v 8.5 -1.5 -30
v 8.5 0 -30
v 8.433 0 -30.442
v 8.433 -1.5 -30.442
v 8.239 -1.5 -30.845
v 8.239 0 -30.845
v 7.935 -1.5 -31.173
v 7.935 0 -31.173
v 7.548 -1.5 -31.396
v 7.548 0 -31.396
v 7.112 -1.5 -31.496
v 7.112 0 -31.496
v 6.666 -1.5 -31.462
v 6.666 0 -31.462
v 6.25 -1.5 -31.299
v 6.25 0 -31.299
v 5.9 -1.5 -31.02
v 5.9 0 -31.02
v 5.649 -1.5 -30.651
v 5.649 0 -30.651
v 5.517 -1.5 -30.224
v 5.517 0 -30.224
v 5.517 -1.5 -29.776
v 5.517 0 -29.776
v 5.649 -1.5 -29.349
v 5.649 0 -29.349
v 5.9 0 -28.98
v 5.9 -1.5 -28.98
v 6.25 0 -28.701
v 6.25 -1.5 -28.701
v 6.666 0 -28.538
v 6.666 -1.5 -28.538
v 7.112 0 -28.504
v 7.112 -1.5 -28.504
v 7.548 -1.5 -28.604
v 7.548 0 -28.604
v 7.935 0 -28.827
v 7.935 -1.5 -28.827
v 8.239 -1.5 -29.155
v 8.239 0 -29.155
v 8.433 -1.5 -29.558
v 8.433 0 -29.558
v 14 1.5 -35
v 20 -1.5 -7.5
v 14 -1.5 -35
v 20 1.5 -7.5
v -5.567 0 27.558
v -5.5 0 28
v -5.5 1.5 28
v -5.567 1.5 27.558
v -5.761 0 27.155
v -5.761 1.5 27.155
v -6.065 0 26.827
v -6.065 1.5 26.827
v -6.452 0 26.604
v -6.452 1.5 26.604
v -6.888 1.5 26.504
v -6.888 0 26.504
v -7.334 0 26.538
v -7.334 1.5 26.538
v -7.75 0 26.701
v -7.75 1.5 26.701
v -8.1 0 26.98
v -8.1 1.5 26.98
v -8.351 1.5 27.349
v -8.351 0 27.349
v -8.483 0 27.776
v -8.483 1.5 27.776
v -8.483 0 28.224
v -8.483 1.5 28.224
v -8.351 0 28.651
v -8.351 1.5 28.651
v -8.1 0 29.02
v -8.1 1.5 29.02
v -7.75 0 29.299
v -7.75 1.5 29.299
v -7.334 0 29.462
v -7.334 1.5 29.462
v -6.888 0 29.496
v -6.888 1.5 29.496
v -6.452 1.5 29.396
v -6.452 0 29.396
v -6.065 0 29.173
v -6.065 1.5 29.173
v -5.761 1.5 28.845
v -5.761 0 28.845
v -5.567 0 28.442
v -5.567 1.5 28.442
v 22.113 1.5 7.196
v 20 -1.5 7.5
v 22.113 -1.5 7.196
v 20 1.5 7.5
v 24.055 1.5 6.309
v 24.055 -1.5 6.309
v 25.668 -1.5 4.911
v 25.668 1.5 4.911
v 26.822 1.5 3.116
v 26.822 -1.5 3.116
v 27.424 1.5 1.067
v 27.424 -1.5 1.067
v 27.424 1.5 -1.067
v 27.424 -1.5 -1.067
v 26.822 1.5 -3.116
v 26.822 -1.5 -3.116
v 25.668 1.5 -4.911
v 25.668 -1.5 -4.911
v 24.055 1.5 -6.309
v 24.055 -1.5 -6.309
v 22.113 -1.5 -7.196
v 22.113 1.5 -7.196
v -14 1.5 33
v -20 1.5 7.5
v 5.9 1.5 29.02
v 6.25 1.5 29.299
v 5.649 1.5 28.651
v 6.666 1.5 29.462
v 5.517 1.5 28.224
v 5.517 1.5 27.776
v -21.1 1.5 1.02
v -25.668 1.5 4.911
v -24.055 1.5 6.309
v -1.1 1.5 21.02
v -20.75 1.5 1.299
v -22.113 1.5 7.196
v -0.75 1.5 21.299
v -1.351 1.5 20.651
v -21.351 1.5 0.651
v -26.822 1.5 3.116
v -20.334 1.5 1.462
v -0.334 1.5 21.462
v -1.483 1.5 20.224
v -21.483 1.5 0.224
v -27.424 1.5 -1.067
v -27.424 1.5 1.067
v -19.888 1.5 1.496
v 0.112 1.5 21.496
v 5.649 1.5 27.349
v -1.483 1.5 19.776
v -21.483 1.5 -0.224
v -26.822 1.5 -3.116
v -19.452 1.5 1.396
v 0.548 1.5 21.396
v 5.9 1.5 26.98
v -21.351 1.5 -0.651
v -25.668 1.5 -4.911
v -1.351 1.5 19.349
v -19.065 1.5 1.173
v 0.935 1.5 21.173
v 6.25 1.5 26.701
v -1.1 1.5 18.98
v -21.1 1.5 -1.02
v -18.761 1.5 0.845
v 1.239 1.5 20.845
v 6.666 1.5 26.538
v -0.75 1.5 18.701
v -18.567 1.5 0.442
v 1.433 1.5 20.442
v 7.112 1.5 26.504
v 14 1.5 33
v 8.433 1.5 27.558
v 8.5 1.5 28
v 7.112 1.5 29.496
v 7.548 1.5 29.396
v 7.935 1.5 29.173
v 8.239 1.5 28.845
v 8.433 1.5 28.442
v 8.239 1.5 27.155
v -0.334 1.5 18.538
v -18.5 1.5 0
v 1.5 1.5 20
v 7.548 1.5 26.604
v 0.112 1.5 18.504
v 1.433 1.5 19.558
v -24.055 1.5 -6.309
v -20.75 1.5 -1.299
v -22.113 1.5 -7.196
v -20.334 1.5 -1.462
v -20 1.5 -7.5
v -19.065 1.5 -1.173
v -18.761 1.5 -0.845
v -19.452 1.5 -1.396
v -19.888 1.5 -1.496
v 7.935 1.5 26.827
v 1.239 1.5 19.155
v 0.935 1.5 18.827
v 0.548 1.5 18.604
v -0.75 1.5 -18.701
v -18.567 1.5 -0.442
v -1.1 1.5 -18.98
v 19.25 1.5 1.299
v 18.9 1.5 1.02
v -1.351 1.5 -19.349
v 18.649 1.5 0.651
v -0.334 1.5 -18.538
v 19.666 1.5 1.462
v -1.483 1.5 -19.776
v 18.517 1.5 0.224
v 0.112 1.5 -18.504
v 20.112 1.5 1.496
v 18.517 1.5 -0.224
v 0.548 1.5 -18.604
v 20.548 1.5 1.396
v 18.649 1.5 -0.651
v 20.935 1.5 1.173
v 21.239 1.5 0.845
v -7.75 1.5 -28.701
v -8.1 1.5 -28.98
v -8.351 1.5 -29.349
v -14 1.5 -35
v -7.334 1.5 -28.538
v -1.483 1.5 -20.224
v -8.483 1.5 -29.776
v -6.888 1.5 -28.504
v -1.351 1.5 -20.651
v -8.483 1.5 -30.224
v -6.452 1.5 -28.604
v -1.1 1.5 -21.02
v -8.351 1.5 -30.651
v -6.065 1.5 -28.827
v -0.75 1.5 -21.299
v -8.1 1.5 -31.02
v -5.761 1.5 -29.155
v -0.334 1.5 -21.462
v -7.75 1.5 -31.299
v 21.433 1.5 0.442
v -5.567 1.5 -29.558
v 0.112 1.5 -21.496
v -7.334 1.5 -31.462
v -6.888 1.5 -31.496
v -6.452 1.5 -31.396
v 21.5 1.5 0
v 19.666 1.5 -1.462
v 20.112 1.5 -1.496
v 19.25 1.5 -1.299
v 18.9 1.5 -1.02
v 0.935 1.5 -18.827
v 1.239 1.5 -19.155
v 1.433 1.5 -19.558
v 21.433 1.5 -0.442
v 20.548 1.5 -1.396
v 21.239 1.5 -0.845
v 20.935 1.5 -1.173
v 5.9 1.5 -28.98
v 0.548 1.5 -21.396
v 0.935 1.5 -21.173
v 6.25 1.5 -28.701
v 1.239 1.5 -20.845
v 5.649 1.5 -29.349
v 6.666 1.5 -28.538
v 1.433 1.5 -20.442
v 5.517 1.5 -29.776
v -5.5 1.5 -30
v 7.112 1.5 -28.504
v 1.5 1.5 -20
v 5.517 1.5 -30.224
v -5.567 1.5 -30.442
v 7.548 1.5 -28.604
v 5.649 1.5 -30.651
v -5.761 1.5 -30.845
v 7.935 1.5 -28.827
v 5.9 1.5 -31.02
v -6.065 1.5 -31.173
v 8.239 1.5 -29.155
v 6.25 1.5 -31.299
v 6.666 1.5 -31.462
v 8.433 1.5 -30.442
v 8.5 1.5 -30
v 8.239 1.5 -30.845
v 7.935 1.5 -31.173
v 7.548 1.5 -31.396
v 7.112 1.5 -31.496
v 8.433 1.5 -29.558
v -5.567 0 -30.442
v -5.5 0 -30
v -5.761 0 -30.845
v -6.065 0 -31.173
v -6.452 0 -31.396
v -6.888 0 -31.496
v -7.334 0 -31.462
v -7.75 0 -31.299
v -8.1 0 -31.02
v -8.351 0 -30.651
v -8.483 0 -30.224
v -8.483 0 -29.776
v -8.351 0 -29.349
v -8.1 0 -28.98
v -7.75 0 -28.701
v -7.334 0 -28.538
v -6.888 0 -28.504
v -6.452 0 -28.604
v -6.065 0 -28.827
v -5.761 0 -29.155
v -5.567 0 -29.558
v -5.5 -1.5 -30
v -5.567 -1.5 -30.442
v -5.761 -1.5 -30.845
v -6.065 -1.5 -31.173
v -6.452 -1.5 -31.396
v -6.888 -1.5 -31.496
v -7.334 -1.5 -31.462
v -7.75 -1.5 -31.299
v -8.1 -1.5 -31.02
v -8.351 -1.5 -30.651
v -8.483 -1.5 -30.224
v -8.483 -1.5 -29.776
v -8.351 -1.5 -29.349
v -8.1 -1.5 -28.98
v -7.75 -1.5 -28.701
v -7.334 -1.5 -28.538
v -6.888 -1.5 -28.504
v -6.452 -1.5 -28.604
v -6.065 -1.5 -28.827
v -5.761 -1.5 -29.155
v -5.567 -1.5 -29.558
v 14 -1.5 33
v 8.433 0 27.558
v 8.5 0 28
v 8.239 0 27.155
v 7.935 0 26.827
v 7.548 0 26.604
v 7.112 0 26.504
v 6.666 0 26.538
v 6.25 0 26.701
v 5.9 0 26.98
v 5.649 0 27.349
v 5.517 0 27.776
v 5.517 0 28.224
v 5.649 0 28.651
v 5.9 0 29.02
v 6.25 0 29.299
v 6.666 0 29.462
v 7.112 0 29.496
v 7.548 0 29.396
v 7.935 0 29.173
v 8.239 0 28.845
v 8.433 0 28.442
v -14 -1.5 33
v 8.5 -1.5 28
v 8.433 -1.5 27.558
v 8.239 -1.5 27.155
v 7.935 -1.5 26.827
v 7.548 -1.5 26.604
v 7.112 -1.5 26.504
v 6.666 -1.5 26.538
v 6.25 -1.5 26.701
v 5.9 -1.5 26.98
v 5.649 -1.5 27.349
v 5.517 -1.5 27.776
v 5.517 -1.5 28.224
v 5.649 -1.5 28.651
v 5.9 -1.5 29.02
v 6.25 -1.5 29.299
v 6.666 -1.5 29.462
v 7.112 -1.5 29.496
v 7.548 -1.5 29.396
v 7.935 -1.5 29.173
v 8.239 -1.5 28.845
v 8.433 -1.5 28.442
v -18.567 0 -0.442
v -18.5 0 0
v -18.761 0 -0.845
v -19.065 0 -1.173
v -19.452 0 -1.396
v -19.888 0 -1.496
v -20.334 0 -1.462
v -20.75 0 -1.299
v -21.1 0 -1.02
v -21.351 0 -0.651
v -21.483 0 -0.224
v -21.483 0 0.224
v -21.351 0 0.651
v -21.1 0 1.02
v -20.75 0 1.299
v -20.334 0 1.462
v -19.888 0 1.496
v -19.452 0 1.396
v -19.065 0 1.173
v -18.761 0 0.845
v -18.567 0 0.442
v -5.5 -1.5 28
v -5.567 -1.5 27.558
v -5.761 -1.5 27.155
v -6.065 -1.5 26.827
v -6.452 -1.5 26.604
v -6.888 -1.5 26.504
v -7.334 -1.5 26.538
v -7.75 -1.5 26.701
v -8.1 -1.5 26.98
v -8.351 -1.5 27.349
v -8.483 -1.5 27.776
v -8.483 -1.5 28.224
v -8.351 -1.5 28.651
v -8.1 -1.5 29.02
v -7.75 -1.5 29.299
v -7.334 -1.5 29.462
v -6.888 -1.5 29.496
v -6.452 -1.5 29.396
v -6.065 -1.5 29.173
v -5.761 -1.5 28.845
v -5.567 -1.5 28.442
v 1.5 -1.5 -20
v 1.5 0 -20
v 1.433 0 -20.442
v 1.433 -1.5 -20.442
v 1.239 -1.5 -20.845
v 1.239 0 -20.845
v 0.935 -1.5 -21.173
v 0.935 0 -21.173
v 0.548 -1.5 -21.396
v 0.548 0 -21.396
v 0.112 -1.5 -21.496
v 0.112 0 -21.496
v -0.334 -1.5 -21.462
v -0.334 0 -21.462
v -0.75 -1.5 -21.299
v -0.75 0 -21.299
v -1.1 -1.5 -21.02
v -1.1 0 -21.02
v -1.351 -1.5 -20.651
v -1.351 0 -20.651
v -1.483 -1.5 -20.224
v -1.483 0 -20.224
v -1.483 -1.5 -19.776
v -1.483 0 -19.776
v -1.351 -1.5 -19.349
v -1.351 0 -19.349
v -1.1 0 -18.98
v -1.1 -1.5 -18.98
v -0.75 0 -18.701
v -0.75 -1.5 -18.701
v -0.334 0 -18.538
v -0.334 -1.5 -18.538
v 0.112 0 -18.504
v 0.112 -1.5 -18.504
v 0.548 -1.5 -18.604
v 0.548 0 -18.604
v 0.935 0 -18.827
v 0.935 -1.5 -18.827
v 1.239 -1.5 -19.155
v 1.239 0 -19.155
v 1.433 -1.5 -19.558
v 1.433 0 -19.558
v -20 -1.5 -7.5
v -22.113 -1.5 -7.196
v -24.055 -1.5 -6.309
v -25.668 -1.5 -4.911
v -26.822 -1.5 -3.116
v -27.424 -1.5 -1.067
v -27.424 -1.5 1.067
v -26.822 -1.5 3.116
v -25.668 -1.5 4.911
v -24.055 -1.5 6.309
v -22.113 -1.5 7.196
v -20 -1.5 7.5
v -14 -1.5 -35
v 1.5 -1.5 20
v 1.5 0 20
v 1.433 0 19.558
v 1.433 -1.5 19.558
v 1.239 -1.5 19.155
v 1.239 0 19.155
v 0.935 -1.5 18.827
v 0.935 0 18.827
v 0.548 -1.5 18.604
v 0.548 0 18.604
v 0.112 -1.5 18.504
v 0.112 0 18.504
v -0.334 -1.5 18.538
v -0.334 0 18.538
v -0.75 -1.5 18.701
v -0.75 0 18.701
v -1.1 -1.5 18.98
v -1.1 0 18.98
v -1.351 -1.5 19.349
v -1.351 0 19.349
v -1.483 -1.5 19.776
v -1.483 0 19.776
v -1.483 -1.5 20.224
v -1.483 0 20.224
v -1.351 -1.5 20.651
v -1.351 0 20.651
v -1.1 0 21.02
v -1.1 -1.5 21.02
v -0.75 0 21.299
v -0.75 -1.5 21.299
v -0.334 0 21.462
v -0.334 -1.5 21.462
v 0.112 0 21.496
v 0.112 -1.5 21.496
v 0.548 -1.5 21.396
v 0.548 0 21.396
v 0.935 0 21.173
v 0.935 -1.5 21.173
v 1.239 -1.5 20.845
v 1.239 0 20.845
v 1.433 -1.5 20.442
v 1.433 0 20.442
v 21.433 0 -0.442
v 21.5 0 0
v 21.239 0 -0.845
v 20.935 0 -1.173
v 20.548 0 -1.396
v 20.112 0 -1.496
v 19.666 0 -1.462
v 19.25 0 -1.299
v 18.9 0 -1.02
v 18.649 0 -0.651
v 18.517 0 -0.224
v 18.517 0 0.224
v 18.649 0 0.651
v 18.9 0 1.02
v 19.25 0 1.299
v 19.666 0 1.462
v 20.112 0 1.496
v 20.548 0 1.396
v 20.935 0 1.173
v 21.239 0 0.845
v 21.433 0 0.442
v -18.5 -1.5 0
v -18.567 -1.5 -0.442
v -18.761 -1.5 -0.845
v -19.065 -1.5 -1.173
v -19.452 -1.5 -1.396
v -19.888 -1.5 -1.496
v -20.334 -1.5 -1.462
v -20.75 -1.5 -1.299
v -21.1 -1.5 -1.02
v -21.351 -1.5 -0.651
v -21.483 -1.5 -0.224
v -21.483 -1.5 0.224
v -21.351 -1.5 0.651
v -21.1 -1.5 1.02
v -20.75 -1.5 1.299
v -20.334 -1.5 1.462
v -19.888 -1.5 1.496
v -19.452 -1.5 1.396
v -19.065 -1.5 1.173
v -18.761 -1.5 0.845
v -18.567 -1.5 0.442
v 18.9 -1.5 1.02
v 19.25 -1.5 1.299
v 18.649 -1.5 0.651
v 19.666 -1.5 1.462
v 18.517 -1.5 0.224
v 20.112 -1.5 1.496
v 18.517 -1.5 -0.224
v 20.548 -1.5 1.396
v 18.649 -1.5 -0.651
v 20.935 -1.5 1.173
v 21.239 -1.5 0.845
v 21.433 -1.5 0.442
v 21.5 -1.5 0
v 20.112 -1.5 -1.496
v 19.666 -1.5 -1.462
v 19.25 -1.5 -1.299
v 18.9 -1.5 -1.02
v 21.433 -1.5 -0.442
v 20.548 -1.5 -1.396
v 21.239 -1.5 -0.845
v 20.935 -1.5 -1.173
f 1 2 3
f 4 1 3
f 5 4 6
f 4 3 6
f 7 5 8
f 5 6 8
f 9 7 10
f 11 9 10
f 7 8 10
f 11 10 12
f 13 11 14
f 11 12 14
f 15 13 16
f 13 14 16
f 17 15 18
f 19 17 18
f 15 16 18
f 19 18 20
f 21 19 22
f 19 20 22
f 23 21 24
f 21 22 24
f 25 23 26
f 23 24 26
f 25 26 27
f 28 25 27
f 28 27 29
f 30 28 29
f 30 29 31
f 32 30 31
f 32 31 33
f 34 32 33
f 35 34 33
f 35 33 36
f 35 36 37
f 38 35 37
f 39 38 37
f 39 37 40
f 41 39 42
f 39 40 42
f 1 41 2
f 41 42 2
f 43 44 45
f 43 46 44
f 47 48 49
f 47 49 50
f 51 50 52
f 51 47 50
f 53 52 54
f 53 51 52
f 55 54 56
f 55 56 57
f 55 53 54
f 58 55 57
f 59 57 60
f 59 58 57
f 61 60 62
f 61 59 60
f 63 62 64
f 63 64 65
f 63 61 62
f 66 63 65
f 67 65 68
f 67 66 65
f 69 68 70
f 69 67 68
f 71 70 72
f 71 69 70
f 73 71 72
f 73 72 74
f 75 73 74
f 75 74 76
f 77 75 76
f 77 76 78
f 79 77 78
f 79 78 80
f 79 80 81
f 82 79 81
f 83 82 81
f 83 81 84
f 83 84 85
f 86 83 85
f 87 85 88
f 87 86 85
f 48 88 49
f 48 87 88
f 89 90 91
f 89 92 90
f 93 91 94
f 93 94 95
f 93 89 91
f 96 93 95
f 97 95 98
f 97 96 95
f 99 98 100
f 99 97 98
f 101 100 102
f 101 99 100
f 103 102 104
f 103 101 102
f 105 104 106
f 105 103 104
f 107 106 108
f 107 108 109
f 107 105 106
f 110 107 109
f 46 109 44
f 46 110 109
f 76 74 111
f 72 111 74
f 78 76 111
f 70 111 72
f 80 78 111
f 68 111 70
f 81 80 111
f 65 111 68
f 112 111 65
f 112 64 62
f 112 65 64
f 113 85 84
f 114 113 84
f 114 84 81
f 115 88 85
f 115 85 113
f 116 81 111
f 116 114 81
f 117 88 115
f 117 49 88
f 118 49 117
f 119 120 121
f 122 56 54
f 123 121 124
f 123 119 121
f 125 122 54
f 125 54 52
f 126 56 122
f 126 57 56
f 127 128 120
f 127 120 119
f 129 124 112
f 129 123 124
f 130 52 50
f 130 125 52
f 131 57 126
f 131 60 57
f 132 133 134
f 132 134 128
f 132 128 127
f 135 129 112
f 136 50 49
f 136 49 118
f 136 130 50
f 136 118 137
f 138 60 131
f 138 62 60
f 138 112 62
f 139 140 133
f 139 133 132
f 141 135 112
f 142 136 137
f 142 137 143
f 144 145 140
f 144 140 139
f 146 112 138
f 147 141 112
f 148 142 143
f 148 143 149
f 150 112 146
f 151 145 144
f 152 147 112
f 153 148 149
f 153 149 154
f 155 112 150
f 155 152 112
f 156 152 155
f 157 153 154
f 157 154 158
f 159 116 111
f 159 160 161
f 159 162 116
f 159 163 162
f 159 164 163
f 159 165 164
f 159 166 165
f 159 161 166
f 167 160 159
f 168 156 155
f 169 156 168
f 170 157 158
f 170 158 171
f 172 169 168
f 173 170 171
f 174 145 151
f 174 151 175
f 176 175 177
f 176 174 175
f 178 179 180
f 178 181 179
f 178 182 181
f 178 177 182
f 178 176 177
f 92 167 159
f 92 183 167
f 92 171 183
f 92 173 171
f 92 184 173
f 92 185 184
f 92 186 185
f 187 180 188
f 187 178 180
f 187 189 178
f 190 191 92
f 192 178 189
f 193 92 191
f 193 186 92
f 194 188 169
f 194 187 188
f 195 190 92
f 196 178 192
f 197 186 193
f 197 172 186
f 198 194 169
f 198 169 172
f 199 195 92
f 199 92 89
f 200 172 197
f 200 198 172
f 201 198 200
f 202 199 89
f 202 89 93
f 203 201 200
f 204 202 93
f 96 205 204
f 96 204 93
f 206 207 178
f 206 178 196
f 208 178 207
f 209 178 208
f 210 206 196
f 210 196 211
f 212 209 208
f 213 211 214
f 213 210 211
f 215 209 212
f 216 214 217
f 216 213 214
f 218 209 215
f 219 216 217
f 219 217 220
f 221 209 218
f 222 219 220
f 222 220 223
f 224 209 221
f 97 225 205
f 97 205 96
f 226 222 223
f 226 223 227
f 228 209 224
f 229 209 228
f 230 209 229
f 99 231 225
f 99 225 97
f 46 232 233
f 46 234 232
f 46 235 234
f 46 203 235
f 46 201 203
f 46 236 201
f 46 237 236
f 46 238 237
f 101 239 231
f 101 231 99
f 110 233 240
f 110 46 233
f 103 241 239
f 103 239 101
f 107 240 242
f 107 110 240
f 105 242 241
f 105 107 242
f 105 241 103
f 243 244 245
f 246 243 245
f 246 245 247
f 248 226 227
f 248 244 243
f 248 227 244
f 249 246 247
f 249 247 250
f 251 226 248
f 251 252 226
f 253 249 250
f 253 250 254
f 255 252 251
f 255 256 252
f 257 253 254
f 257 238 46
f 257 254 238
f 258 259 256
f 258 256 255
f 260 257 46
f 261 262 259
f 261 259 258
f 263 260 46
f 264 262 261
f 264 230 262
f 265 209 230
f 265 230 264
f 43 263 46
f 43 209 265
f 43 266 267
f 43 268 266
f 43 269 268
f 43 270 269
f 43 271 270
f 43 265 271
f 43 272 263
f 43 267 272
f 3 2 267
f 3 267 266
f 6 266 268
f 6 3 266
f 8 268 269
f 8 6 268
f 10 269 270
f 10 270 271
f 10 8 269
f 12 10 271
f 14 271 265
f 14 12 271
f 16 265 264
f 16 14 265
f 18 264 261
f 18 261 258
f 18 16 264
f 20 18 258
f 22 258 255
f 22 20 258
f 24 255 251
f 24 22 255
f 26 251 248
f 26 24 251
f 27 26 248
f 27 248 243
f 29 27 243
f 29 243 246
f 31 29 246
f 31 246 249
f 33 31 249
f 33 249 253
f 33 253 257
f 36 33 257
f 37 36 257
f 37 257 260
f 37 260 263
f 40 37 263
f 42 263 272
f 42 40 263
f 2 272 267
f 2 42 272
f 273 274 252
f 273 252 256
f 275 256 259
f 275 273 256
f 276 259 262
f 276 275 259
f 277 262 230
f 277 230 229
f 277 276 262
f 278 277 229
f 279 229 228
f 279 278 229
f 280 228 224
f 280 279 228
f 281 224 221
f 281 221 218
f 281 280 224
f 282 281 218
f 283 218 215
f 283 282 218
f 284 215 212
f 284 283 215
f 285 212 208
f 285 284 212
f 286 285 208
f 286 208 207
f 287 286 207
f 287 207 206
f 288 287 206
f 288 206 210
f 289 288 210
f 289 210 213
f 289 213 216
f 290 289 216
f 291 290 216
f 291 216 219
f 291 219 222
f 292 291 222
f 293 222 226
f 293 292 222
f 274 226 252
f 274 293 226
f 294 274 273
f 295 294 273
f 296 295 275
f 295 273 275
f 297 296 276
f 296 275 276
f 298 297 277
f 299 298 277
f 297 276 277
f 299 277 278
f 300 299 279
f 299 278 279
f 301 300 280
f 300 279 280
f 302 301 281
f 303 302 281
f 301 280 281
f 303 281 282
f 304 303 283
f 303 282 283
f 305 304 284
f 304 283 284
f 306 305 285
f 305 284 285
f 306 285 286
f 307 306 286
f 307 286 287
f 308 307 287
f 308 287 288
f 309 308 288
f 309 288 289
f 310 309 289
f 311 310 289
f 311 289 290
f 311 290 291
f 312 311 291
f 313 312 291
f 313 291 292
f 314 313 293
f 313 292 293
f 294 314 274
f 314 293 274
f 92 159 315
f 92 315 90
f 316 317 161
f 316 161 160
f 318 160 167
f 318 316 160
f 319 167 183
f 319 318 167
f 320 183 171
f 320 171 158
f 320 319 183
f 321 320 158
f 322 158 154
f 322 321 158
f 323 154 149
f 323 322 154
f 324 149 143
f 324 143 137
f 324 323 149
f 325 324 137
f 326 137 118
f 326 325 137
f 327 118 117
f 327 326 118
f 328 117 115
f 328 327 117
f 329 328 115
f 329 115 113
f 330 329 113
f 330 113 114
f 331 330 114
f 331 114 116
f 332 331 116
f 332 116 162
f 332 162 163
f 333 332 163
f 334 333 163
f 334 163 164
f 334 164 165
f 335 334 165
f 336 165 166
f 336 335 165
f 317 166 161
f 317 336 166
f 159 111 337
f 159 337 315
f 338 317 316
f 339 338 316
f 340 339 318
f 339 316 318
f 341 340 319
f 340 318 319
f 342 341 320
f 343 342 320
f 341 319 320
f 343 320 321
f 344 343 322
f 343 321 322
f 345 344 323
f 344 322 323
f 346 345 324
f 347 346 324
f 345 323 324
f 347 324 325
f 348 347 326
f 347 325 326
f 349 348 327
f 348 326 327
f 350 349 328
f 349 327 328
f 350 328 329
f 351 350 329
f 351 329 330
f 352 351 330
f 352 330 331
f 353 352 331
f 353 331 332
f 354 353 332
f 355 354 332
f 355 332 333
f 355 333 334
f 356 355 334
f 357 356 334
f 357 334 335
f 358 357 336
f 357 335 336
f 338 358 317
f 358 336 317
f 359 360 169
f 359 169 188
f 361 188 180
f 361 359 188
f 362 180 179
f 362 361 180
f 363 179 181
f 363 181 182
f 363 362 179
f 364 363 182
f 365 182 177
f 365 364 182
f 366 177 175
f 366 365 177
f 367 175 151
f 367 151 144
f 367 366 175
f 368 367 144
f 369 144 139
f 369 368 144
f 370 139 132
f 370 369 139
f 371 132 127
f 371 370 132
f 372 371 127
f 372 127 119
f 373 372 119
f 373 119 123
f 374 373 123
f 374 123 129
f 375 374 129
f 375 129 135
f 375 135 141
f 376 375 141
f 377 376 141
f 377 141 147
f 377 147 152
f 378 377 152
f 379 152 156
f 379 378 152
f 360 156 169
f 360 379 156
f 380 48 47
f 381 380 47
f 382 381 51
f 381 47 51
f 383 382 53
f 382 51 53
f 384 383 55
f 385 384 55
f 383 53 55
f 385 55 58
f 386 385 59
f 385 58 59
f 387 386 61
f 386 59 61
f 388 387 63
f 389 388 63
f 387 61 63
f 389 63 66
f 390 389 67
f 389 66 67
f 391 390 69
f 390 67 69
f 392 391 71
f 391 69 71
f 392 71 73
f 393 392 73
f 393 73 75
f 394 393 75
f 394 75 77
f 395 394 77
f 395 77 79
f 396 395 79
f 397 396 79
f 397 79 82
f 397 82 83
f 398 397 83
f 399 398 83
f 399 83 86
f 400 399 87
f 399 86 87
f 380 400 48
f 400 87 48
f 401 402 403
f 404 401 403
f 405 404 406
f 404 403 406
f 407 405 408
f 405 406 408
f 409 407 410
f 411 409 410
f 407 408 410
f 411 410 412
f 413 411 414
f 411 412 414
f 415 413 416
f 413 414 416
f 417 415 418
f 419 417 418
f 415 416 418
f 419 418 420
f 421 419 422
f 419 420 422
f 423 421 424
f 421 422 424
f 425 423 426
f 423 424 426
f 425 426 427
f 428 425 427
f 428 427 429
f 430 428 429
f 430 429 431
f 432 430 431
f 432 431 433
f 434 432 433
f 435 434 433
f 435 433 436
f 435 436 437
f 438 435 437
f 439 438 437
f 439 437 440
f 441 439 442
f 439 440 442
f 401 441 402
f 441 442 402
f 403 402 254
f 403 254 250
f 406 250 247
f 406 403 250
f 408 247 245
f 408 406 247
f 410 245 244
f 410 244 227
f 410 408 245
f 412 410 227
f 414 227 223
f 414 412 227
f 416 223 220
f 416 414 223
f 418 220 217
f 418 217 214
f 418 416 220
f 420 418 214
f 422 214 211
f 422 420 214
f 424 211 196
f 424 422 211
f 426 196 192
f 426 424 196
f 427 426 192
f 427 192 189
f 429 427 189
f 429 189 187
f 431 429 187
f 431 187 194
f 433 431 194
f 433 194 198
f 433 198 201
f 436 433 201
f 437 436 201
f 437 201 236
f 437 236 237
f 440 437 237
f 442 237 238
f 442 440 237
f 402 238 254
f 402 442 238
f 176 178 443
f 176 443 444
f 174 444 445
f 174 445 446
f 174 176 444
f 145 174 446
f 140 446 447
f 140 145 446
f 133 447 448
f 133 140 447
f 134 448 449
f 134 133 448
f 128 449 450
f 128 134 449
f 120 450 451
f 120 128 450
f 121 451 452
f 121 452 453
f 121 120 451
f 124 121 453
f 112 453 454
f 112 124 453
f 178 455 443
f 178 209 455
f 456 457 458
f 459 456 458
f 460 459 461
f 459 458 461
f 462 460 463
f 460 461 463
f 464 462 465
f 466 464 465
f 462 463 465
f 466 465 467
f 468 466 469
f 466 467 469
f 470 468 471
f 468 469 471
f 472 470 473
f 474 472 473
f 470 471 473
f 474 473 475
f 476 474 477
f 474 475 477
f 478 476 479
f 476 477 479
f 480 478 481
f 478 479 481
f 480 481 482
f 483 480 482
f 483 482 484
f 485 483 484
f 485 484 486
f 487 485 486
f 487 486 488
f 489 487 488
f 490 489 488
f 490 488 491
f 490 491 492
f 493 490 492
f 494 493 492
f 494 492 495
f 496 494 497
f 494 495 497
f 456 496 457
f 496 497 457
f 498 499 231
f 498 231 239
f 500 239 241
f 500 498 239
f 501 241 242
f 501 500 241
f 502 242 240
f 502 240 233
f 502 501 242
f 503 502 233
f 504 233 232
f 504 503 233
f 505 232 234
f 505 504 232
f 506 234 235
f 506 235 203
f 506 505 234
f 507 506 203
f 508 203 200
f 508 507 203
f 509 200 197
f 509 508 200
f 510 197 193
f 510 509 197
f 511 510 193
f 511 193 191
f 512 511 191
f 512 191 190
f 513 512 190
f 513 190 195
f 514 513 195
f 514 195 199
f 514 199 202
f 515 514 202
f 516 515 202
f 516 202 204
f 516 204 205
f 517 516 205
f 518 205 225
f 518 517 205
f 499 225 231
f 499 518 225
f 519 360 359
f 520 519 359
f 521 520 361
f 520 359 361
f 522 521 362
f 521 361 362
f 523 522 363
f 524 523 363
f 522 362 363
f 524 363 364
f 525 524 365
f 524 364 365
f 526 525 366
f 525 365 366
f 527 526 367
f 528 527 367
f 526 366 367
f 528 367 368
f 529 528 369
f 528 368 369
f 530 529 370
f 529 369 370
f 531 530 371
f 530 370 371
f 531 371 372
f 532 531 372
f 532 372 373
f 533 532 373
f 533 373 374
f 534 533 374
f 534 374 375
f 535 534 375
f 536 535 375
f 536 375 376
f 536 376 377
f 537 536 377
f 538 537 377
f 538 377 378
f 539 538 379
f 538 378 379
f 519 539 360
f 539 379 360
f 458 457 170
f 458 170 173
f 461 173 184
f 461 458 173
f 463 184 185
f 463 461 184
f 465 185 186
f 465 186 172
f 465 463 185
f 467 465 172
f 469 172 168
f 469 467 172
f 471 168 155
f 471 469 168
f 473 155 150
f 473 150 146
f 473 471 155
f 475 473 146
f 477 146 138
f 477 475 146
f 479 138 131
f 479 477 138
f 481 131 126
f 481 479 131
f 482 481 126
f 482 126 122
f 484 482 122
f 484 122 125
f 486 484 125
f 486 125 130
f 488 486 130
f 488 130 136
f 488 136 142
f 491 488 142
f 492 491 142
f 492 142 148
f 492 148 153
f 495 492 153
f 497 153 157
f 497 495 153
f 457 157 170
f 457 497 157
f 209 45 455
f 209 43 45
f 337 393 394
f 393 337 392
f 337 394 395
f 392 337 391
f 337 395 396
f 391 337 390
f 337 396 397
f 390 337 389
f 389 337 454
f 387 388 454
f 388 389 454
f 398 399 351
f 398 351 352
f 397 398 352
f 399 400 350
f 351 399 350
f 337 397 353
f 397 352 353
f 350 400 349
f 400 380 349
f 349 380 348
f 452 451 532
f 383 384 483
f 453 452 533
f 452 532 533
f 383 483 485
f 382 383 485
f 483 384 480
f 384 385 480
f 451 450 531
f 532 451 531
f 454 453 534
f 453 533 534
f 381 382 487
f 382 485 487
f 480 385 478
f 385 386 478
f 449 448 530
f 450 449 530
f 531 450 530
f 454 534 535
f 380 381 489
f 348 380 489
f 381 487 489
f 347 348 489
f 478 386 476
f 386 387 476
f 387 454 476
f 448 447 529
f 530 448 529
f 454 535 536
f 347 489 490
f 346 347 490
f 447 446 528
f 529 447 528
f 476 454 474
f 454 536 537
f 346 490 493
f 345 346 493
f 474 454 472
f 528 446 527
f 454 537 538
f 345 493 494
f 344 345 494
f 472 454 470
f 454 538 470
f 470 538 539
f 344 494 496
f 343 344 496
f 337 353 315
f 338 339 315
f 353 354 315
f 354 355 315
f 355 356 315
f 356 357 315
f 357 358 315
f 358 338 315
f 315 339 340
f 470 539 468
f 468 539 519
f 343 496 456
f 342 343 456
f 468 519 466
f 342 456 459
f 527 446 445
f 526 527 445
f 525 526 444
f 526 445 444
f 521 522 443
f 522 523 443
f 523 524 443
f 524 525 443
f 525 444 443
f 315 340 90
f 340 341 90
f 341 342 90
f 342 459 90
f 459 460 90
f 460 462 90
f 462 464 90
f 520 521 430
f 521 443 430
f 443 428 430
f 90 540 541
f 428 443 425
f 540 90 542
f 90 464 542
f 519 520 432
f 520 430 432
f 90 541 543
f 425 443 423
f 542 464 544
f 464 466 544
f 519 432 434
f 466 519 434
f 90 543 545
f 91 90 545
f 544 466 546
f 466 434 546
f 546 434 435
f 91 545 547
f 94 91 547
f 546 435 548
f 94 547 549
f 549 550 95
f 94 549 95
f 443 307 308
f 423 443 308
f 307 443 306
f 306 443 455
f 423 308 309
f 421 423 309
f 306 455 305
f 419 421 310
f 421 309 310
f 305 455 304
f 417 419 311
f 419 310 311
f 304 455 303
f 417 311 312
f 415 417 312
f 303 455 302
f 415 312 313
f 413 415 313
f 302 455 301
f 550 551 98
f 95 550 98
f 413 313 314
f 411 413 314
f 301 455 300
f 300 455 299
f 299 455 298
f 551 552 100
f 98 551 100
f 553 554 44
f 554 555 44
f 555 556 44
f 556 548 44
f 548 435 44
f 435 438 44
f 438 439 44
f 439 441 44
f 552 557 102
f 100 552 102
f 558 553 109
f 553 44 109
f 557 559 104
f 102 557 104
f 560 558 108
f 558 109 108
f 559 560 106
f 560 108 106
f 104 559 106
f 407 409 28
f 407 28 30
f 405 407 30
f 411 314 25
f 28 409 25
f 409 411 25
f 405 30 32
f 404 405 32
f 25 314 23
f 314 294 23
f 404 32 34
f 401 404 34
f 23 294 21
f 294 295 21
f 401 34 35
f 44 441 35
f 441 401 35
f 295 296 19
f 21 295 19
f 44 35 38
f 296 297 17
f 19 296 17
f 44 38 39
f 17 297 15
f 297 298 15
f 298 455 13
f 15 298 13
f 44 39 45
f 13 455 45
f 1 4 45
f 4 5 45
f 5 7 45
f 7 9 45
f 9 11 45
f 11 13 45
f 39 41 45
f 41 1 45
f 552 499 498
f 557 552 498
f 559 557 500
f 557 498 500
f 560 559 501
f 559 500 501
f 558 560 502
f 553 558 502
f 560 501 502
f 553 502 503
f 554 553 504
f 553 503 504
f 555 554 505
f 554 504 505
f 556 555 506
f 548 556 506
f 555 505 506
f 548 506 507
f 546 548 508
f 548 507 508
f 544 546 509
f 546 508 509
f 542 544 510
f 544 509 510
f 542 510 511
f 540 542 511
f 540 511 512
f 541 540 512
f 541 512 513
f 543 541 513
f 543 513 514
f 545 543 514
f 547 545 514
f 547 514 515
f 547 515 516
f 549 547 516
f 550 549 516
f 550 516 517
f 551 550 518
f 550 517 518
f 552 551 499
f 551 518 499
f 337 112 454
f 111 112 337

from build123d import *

# Parameters (mm, degrees)
BOSS_EXTRUDE1_DEPTH      = 1.5
BOSS_EXTRUDE1_DEPTH_BACK = 1.5
SKETCH1_R                = 1.5


with BuildPart() as part:
    # Sketch1 → Boss-Extrude1 (new, two sides: drawn at the far end of the back side and taken through both)
    with BuildSketch(Plane(origin=(0, 0, 0), x_dir=(1, 0, 0), z_dir=(0, 1, 0)).offset(-BOSS_EXTRUDE1_DEPTH_BACK)):
        with BuildLine():
            Line((-14, 35), (-20, 7.5))
            ThreePointArc((-20, 7.5), (-27.5, 0), (-20, -7.5))
            Line((-20, -7.5), (-14, -33))
            Line((-14, -33), (14, -33))
            Line((14, -33), (20, -7.5))
            ThreePointArc((20, -7.5), (27.5, 0), (20, 7.5))
            Line((20, 7.5), (14, 35))
            Line((14, 35), (-14, 35))
        make_face()
        with Locations((0, 20)):
            Circle(SKETCH1_R, mode=Mode.SUBTRACT)
        with Locations((0, -20)):
            Circle(SKETCH1_R, mode=Mode.SUBTRACT)
        with Locations((-7, -28)):
            Circle(SKETCH1_R, mode=Mode.SUBTRACT)
        with Locations((-7, 30)):
            Circle(SKETCH1_R, mode=Mode.SUBTRACT)
        with Locations((7, 30)):
            Circle(SKETCH1_R, mode=Mode.SUBTRACT)
        with Locations((7, -28)):
            Circle(SKETCH1_R, mode=Mode.SUBTRACT)
        with Locations((-20, 0)):
            Circle(SKETCH1_R, mode=Mode.SUBTRACT)
        with Locations((20, 0)):
            Circle(SKETCH1_R, mode=Mode.SUBTRACT)
    extrude(amount=BOSS_EXTRUDE1_DEPTH + BOSS_EXTRUDE1_DEPTH_BACK)


solid = part.part
